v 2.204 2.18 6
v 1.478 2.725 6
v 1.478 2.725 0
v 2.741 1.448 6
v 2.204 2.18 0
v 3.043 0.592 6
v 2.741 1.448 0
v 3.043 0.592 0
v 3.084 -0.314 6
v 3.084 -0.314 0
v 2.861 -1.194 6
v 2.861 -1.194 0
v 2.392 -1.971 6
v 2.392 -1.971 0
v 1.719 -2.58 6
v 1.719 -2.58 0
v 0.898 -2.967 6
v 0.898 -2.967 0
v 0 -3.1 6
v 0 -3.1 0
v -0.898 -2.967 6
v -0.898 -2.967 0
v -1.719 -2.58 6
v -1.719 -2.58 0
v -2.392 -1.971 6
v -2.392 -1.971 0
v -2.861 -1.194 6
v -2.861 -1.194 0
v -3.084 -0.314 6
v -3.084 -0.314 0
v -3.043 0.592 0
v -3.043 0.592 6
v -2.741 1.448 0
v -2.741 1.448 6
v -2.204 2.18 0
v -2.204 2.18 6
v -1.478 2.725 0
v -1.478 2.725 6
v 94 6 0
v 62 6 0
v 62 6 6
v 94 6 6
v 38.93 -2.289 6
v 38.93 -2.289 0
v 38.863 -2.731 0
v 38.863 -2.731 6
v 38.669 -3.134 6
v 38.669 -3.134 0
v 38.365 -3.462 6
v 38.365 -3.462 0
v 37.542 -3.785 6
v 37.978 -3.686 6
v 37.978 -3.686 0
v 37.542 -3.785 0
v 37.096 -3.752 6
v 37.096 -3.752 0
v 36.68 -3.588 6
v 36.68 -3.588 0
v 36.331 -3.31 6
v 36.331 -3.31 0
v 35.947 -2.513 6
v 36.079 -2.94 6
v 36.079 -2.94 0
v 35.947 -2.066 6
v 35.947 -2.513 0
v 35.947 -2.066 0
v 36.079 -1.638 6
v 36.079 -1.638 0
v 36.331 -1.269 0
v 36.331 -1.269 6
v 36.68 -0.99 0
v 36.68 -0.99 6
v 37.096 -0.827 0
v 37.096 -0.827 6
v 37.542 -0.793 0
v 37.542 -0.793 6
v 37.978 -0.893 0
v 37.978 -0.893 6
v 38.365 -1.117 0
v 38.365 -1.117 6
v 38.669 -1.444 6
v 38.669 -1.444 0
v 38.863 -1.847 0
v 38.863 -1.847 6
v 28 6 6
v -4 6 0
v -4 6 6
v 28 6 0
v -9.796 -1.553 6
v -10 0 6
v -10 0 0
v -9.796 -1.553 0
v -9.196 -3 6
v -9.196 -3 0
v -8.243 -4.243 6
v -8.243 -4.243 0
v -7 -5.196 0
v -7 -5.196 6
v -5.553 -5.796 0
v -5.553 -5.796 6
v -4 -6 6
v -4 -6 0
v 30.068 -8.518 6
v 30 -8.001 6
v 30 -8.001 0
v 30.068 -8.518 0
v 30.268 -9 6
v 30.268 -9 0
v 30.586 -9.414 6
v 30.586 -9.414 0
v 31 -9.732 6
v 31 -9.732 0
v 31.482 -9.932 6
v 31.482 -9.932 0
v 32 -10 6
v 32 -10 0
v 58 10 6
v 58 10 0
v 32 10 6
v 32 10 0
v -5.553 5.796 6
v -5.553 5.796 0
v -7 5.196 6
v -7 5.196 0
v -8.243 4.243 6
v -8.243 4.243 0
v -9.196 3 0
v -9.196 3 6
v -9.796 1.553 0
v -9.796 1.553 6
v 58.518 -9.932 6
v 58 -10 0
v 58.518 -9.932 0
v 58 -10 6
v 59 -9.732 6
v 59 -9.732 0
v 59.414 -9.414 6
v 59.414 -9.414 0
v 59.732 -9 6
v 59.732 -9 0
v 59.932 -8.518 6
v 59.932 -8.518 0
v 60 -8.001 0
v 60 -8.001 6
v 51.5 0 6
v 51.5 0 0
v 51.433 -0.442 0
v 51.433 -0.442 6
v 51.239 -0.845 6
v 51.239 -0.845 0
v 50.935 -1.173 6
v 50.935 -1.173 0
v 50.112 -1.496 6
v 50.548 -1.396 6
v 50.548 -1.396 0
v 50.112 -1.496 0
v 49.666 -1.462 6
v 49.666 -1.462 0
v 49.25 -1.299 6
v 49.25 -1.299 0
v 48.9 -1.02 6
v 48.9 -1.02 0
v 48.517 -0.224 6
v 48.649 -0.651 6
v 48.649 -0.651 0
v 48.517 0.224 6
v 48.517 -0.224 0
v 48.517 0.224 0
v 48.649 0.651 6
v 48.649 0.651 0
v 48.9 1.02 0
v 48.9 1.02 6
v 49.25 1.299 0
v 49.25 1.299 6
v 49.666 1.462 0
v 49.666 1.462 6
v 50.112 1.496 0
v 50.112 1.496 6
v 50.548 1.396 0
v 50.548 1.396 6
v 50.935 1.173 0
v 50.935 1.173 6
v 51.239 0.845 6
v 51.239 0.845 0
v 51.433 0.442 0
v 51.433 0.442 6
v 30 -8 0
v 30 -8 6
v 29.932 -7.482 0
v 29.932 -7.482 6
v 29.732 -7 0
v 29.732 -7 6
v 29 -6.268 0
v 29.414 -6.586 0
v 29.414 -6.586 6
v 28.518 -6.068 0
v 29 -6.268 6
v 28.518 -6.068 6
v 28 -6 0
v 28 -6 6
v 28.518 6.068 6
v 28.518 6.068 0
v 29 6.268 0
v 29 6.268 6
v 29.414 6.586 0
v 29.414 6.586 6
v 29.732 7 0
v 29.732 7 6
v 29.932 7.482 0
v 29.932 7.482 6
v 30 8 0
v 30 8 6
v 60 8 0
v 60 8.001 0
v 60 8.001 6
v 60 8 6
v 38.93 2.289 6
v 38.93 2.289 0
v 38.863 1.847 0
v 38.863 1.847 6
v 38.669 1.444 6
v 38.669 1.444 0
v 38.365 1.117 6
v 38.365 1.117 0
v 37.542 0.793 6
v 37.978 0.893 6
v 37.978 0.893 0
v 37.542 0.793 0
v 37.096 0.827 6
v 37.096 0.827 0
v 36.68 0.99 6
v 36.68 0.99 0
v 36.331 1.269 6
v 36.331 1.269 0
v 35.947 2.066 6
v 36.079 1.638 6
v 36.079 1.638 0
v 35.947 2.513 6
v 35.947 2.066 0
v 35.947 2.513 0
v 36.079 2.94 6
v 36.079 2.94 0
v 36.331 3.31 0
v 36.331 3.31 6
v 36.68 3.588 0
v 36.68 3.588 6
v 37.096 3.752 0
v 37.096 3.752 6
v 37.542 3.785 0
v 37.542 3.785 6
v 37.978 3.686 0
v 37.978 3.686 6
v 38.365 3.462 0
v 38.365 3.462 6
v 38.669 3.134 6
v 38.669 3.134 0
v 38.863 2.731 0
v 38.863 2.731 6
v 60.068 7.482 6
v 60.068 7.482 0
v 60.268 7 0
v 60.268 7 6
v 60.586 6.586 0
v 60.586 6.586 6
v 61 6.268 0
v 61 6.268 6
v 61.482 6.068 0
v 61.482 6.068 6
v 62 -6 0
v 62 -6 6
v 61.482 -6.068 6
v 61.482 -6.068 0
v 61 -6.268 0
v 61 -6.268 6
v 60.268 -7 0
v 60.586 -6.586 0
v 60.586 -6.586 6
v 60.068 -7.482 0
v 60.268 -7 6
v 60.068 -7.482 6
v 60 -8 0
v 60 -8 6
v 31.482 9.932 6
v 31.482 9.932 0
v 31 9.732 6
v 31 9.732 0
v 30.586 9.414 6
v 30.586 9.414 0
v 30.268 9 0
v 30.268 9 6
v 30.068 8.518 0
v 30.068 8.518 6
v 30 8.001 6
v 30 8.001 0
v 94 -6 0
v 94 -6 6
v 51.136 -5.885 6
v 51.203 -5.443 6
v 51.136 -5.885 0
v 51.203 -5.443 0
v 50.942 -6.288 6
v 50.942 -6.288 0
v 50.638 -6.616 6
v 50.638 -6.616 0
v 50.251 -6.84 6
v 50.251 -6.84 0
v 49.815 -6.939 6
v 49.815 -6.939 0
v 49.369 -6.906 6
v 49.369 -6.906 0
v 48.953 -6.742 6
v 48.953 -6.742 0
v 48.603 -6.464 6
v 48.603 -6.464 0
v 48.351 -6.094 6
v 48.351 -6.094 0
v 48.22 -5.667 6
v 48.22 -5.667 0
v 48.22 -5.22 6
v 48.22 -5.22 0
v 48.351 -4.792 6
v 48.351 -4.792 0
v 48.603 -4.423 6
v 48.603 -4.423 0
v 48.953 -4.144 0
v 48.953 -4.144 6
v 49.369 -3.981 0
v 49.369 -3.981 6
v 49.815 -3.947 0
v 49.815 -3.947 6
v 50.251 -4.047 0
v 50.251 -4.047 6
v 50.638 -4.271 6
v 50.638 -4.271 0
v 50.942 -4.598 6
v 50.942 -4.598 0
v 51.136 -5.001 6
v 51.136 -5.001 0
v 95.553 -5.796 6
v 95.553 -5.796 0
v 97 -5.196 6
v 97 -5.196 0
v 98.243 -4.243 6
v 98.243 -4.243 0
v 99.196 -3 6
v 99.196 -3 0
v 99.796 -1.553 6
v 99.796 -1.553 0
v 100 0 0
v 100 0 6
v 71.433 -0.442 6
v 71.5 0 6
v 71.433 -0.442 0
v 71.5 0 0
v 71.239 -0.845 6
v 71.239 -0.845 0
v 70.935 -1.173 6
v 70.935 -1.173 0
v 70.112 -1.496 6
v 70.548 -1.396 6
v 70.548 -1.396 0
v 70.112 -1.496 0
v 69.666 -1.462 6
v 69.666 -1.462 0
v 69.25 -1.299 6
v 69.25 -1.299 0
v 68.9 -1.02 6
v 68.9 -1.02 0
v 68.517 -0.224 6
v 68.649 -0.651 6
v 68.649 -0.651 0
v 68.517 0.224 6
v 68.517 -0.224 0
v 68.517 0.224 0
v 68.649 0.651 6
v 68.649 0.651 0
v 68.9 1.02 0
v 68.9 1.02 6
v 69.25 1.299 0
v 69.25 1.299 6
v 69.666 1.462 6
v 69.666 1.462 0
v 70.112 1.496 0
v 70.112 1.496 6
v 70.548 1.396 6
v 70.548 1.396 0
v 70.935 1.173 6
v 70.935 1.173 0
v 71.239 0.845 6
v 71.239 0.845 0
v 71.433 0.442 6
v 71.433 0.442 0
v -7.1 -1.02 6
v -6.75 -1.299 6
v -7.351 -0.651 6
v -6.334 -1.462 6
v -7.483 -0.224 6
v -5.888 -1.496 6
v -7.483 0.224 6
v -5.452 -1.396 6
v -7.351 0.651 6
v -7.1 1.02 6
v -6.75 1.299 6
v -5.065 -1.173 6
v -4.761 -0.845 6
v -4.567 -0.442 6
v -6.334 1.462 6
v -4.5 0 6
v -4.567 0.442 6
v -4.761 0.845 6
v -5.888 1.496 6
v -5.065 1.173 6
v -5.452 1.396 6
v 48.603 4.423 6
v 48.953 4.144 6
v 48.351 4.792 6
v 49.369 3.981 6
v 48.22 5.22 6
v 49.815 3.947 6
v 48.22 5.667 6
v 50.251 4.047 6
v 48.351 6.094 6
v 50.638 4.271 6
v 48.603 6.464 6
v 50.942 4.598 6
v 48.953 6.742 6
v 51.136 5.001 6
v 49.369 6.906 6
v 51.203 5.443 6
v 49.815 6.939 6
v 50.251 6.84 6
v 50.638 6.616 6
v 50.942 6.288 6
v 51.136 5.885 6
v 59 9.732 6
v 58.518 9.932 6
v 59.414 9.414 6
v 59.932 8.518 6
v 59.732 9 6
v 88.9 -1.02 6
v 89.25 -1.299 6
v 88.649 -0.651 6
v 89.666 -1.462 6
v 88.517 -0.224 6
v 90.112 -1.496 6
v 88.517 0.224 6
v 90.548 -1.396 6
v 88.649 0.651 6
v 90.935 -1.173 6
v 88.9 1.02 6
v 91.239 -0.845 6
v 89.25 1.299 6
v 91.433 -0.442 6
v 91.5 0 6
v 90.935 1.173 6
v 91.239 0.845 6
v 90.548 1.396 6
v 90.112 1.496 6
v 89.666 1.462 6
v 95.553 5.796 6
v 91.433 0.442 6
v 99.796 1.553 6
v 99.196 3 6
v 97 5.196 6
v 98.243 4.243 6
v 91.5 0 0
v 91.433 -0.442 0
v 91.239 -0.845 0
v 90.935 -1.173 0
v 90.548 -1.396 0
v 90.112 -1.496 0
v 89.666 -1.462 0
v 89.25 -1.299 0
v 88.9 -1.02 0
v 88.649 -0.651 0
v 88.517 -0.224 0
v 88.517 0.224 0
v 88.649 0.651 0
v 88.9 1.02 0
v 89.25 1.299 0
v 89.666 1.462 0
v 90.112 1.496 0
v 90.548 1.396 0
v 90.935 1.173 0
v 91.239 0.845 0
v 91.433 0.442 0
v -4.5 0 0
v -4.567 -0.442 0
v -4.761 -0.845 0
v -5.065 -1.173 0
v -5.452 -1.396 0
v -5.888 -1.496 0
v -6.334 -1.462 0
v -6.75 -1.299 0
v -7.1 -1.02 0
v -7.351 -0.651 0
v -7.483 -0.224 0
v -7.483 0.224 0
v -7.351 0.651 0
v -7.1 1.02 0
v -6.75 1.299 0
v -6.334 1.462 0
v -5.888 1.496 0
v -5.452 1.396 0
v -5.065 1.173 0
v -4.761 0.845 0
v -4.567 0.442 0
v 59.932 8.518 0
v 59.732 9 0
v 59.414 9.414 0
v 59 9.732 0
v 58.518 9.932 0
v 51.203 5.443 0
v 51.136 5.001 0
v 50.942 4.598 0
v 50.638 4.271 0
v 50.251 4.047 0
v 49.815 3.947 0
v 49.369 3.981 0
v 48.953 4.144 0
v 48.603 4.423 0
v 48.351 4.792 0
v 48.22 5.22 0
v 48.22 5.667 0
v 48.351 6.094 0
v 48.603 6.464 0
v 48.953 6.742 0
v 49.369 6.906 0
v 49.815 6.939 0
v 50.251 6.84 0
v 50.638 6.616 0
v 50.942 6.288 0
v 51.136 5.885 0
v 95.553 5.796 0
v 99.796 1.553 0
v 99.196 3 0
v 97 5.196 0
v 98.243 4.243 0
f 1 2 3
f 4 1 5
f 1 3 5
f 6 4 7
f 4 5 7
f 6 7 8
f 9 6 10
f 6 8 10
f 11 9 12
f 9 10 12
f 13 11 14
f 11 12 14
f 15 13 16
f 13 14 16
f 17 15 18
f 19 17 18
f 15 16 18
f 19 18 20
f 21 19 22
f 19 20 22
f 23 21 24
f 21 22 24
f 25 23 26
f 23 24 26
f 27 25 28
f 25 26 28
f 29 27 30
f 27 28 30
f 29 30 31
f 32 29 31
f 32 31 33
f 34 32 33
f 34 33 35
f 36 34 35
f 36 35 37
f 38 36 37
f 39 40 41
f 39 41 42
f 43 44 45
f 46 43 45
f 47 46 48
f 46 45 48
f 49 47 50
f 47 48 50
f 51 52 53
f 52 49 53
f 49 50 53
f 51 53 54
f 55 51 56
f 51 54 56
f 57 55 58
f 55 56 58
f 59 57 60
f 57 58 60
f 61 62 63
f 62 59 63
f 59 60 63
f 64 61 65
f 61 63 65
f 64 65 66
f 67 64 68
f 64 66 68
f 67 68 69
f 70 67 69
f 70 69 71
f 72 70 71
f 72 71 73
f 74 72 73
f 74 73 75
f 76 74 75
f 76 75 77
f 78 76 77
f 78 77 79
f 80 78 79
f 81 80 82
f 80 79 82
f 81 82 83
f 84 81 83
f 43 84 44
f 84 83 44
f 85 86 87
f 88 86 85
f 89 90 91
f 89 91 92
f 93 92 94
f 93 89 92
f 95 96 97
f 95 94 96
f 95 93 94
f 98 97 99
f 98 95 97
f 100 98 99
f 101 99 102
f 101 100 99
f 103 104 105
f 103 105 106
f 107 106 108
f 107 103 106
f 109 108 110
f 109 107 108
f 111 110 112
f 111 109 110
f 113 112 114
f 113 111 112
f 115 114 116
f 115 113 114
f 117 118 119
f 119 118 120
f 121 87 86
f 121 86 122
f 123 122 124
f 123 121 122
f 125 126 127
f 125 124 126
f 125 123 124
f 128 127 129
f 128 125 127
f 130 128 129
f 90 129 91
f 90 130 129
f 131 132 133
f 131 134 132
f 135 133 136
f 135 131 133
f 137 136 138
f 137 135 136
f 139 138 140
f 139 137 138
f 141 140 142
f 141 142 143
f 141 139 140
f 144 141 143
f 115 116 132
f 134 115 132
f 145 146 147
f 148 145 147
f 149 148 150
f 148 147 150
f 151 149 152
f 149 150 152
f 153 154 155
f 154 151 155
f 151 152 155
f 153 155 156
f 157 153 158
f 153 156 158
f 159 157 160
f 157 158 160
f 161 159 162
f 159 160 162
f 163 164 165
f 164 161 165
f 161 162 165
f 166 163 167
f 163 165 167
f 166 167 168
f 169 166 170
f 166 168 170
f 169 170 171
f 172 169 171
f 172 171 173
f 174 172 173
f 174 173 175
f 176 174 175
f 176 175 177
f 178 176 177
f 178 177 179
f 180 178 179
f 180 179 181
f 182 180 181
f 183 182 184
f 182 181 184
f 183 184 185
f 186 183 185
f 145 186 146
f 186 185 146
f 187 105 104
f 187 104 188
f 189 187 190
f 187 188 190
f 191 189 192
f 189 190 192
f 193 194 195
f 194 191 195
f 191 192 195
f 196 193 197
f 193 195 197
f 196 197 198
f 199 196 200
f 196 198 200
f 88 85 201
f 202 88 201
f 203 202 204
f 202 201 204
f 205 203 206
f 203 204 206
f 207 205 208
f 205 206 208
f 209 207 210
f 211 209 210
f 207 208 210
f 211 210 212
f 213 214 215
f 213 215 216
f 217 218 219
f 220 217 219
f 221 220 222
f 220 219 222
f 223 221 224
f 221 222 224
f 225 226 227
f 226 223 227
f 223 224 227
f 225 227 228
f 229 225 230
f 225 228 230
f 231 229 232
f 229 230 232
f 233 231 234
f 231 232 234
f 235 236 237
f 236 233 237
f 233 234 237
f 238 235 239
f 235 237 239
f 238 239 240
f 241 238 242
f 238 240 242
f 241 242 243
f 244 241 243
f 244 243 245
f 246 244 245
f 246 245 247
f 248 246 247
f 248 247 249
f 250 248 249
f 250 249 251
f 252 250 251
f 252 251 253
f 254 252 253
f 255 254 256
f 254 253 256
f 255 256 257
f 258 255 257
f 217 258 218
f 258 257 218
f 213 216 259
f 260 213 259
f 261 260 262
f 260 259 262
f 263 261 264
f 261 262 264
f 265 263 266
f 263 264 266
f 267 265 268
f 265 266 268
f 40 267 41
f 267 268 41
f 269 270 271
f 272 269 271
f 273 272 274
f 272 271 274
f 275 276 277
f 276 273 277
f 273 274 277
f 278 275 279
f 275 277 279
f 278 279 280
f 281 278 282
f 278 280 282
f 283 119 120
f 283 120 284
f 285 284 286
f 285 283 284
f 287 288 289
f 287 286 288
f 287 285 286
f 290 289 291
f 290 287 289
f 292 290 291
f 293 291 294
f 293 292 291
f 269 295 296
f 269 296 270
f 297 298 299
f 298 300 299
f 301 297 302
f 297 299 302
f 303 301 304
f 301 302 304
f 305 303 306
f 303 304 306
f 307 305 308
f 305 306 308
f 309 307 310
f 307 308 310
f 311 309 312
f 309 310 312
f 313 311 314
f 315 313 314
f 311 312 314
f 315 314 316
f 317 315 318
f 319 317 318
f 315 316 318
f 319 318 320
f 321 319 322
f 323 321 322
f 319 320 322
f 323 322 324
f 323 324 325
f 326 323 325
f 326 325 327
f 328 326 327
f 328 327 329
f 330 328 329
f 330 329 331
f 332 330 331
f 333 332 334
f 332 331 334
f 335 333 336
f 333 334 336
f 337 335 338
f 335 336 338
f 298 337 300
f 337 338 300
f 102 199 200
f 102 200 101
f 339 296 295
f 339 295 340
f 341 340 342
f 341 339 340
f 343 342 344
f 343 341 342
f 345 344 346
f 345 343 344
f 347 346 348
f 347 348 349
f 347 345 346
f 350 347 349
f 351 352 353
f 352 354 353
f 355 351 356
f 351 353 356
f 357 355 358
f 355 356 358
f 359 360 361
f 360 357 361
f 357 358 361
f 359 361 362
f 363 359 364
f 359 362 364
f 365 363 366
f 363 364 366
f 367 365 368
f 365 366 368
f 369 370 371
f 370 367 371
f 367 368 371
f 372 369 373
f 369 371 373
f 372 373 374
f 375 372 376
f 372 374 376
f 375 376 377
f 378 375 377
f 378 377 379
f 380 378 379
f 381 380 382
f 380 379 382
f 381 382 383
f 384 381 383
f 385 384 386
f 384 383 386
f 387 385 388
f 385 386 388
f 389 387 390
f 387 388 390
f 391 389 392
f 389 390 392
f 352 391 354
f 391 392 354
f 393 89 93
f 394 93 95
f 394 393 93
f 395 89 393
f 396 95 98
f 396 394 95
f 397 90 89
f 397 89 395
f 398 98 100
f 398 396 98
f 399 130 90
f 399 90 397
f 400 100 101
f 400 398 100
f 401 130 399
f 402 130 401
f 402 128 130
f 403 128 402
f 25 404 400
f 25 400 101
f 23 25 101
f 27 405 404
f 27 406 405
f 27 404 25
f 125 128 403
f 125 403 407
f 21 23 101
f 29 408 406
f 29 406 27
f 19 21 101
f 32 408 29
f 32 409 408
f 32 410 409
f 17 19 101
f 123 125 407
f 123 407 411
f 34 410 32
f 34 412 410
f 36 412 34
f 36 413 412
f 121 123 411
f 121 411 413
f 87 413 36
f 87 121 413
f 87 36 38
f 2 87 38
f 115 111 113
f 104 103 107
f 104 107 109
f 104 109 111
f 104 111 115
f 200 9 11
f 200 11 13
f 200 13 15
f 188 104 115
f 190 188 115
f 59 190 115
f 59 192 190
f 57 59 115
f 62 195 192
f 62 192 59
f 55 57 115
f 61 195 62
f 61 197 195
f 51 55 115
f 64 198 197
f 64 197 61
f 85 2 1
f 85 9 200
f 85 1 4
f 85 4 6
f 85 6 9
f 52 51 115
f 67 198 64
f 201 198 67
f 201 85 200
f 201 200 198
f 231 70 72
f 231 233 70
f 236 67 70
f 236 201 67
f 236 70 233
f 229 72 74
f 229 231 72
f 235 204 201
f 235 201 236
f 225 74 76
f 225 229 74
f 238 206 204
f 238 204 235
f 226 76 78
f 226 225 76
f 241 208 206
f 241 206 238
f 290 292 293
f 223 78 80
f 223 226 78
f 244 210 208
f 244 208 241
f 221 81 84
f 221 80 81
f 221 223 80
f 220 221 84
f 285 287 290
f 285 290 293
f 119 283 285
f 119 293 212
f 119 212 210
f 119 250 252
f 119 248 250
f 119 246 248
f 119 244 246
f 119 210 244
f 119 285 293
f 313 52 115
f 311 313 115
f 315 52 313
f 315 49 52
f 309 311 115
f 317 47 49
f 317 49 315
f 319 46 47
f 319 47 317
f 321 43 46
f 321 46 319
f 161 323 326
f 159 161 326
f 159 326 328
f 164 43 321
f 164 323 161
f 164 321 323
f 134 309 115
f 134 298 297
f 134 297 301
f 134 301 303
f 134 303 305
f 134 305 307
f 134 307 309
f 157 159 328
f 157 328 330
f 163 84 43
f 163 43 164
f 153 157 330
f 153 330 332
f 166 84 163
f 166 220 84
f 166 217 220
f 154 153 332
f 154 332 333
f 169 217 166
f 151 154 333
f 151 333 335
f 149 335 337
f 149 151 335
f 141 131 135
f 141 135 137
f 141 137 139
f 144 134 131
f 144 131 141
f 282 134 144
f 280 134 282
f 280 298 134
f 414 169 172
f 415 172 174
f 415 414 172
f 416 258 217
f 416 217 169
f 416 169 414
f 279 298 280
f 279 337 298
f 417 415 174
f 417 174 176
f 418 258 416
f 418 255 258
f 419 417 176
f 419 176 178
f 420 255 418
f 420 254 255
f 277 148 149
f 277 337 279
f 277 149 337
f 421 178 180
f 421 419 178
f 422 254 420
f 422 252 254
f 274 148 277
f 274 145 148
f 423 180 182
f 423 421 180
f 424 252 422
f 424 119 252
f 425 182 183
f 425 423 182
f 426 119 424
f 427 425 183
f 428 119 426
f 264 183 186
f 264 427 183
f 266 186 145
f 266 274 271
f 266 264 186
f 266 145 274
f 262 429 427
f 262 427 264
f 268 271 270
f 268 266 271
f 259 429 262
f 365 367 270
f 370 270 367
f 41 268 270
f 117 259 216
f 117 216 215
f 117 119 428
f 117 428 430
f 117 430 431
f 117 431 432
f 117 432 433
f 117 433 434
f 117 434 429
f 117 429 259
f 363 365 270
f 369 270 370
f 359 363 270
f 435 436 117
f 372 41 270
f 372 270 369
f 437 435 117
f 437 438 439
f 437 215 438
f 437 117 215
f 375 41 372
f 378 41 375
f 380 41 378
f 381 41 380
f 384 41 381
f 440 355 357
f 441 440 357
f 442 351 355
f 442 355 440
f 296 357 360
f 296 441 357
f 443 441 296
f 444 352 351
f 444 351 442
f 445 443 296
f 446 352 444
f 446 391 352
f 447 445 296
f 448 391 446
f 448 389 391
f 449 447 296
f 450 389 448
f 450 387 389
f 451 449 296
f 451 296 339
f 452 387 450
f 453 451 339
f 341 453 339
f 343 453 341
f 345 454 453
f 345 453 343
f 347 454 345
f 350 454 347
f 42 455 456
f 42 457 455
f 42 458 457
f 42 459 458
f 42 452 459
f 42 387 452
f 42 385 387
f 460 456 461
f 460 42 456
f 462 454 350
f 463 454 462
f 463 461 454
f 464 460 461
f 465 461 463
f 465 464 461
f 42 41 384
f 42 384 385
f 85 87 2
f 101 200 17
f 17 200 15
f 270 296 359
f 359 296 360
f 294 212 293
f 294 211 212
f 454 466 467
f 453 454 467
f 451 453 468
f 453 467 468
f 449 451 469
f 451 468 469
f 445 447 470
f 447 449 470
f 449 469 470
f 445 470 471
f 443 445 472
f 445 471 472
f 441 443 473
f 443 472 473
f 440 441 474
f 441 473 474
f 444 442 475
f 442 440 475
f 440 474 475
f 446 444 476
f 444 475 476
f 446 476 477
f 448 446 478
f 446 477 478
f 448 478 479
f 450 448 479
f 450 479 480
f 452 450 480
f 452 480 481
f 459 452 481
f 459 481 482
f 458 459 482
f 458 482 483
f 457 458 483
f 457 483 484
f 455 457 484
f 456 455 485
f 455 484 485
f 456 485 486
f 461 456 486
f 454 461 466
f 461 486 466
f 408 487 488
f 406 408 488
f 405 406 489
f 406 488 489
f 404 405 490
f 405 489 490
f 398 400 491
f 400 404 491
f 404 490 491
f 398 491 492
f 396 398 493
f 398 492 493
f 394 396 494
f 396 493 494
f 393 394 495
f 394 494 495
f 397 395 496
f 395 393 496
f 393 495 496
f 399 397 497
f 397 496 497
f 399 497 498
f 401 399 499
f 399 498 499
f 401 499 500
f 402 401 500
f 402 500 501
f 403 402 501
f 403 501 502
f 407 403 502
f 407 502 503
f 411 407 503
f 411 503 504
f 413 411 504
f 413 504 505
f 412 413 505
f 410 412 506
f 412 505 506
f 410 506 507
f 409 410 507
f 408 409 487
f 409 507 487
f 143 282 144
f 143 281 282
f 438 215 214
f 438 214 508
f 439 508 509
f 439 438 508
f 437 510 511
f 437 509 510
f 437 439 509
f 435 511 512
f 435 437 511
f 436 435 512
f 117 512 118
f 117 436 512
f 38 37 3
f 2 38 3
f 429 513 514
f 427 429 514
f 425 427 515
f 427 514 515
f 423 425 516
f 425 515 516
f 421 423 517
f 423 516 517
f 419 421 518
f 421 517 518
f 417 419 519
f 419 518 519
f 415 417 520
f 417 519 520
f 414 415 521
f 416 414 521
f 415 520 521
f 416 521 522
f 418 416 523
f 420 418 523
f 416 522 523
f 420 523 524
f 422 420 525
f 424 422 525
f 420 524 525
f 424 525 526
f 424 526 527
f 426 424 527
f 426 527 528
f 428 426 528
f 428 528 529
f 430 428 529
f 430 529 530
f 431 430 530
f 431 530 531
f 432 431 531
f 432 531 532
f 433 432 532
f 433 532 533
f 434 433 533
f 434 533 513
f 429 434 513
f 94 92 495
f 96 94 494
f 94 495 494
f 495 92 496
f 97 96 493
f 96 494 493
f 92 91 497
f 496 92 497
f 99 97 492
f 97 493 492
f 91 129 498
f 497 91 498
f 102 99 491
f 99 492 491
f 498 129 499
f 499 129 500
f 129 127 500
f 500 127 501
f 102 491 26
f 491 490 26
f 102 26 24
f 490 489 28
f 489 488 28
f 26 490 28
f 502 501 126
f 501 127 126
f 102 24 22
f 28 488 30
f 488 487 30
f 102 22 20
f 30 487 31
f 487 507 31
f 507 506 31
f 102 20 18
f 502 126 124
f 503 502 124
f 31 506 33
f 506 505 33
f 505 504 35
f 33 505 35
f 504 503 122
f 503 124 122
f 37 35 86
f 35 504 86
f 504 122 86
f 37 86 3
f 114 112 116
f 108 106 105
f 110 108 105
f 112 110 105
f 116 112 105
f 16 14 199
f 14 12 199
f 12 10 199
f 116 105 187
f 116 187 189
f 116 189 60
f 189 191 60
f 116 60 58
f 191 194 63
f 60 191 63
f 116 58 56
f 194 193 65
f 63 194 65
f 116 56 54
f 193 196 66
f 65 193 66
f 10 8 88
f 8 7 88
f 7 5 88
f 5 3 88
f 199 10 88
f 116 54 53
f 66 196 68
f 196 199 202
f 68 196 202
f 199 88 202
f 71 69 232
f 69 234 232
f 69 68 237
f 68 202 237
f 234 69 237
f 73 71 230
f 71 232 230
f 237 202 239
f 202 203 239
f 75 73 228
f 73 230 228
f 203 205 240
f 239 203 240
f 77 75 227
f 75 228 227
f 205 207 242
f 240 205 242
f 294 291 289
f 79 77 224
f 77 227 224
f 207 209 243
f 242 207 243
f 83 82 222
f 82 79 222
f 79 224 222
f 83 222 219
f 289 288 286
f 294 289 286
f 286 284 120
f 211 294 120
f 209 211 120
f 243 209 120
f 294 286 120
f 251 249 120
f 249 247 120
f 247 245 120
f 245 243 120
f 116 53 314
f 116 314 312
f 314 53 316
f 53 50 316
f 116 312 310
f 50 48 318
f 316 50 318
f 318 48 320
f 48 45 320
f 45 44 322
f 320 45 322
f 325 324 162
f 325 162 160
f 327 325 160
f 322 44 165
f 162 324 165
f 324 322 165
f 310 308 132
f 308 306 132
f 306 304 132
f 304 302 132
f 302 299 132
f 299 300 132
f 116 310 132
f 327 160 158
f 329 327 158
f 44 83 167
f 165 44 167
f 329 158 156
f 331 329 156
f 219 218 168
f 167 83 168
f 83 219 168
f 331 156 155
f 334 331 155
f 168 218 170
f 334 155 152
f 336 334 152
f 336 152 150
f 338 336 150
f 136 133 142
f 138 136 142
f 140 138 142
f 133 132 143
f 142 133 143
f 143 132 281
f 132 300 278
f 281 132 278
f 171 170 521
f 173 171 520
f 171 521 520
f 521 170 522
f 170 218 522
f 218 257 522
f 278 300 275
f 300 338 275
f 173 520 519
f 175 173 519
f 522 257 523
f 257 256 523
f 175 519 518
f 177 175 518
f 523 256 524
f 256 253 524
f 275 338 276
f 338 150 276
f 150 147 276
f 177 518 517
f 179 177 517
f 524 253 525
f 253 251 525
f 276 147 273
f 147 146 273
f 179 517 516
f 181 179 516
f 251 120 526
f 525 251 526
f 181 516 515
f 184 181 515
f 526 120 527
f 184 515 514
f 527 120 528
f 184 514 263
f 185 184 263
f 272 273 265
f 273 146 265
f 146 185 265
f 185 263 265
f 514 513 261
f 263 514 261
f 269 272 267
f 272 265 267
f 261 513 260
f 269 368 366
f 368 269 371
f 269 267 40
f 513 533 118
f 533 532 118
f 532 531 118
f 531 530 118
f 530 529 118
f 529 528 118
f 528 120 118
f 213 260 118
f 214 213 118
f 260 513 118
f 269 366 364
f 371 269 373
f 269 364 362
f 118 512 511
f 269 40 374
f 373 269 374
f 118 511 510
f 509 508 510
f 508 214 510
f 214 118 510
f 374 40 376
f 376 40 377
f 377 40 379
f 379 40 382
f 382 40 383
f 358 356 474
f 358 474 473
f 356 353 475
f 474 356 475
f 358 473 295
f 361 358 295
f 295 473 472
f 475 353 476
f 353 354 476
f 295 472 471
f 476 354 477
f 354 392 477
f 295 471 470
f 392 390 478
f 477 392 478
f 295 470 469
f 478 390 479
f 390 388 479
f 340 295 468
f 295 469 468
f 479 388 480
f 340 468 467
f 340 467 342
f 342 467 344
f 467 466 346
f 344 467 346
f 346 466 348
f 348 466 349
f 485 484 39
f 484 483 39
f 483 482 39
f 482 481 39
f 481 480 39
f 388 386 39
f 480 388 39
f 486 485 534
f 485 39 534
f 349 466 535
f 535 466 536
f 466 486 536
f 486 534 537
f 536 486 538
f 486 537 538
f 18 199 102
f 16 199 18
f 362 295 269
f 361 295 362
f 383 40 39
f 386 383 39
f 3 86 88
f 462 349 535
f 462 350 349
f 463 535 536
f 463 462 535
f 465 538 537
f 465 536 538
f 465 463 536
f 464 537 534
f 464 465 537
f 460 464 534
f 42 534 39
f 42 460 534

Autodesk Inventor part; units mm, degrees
ref_plane "YZ Plane" through (0, 0, 0) normal (1, 0, 0) x (0, 1, 0)
ref_plane "XZ Plane" through (0, 0, 0) normal (0, 1, 0) x (-1, 0, 0)
ref_plane "XY Plane" through (0, 0, 0) normal (0, 0, 1) x (1, 0, 0)
sketch "Sketch1" plane through (0, 0, 0) normal (0, 0, 1) x (1, 0, 0)
  line L0 (0, 0) -> (90, 0) construction
  line L1 (0, -10) -> (90, -10)
  line L2 (90, 10) -> (0, 10)
  arc A0 (0, 10) -> (0, -10) centre (0, 0) ccw
  arc A1 (90, -10) -> (90, 10) centre (90, 0) ccw
  line L3 (0, 0) -> (90, 0) construction
  circle A2 centre (0, 0) radius 3.1
  circle A3 centre (-6, 0) radius 1.5
  circle A4 centre (0, 0) radius 37.5 construction
  circle A5 centre (0, 0) radius 50 construction
  circle A6 centre (37.4301, 2.2893) radius 1.5
  circle A7 centre (37.4301, -2.2893) radius 1.5
  circle A8 centre (50, 0) radius 1.5
  circle A9 centre (49.7028, 5.4433) radius 1.5
  circle A10 centre (49.7028, -5.4433) radius 1.5
  line L4 (37.4301, 2.2893) -> (0, 0) construction
  line L5 (0, 0) -> (49.7028, 5.4433) construction
  line L6 (37.4301, -2.2893) -> (0, 0) construction
  line L7 (49.7028, -5.4433) -> (0, 0) construction
  circle A11 centre (90, 0) radius 1.5
  line L8 (-10, 10) -> (10, 10)
  line L9 (10, 10) -> (10, -10)
  line L10 (10, -10) -> (-10, -10)
  line L11 (-10, -10) -> (-10, 10)
  line L12 (-10, 10) -> (10, -10) construction
  line L13 (10, 10) -> (-10, -10) construction
  line L14 (80, 10) -> (100, 10)
  line L15 (100, 10) -> (100, -10)
  line L16 (100, -10) -> (80, -10)
  line L17 (80, -10) -> (80, 10)
  line L18 (80, 10) -> (100, -10) construction
  line L19 (100, 10) -> (80, -10) construction
  line L20 (30, 10) -> (60, 10)
  line L21 (60, 10) -> (60, -10)
  line L22 (60, -10) -> (30, -10)
  line L23 (30, -10) -> (30, 10)
  line L24 (30, 10) -> (60, -10) construction
  line L25 (60, 10) -> (30, -10) construction
  line L26 (-10, 6) -> (100, 6)
  line L27 (100, 6) -> (100, -6)
  line L28 (100, -6) -> (-10, -6)
  line L29 (-10, -6) -> (-10, 6)
  line L30 (-10, 6) -> (100, -6) construction
  line L31 (100, 6) -> (-10, -6) construction
  line L32 (-1.478, 2.725) -> (1.478, 2.725)
  circle A12 centre (70, 0) radius 1.5
  point P0 (45, 0)
  point P1 (30, 6)
  point P2 (30, -6)
  point P3 (60, -6)
  point P4 (60, 6)
  dimension "d0" = 90
  dimension "d1" = 0
  dimension "d2" = 20
  dimension "d4" = 6.2
  dimension "d5" = 3
  dimension "d6" = 6
  dimension "d7" = 0
  dimension "d8" = 75
  dimension "d9" = 100
  dimension "d10" = 3
  dimension "d11" = 3
  dimension "d12" = 3
  dimension "d13" = 3
  dimension "d14" = 3
  dimension "d15" = 3.5
  dimension "d16" = 3.5
  dimension "d17" = 6.25
  dimension "d18" = 6.25
  dimension "d19" = 3
  dimension "d22" = 20
  dimension "d23" = 20
  dimension "d24" = 20
  dimension "d25" = 20
  dimension "d26" = 30
  dimension "d27" = 20
  dimension "d28" = 12
  dimension "d31" = 2.725
  dimension "d32" = 3
  dimension "d33" = 20
  dimension "d34" = 0
extrude "Extrusion1" add sketch "Sketch1" along normal blind 6 contours L28 L11 A0 | A0 L26 L9 L28 | L23 L28 A10 L21 L1 | L9 L26 L23 L28 | L11 L26 A0 | L23 L26 A9 L21 L28 A10 | L21 L26 L17 L28 | L23 L2 L21 L26 A9 | L17 L26 A1 L28 | A1 L15 L28 | A1 L26 L15 | L32 A2 picked at (0.2541, 2.8183)
fillet "Fillet1" radius 2 8 edges at (30, 6, 3) (30, 10, 3) (60, 10, 3) (60, 6, 3) (60, -6, 3) (60, -10, 3) (30, -10, 3) (30, -6, 3)
fillet "Fillet1" radius 6 4 edges at (-10, -6, 3) (-10, 6, 3) (100, -6, 3) (100, 6, 3)
sketch "Sketch2" plane through (0, 0, 6) normal (0, 0, 1) x (1, 0, 0)
  arc A0 (94, -6) -> (94, 6) centre (94, 0) ccw projected
  line L0 (94, 6) -> (62, 6) projected
  arc A1 (60, 8) -> (62, 6) centre (62, 8) ccw projected
  arc A2 (60, 8) -> (58, 10) centre (58, 8) ccw projected
  line L1 (58, 10) -> (32, 10) projected
  arc A3 (32, 10) -> (30, 8) centre (32, 8) ccw projected
  arc A4 (28, 6) -> (30, 8) centre (28, 8) ccw projected
  line L2 (28, 6) -> (-4, 6) projected
  arc A5 (-4, 6) -> (-4, -6) centre (-4, 0) ccw projected
  line L3 (-4, -6) -> (28, -6) projected
  arc A6 (30, -8) -> (28, -6) centre (28, -8) ccw projected
  arc A7 (30, -8) -> (32, -10) centre (32, -8) ccw projected
  line L4 (32, -10) -> (58, -10) projected
  arc A8 (58, -10) -> (60, -8) centre (58, -8) ccw projected
  arc A9 (62, -6) -> (60, -8) centre (62, -8) ccw projected
  line L5 (62, -6) -> (94, -6) projected
  circle A10 centre (90, 0) radius 1.5 projected
  circle A11 centre (70, 0) radius 1.5 projected
  circle A12 centre (49.7028, 5.4433) radius 1.5 projected
  circle A13 centre (50, 0) radius 1.5 projected
  circle A14 centre (37.4301, -2.2893) radius 1.5 projected
  circle A15 centre (37.4301, 2.2893) radius 1.5 projected
  circle A16 centre (-6, 0) radius 1.5 projected
  circle A17 centre (49.7028, -5.4433) radius 1.5 projected
  line L6 (-1.478, 2.725) -> (1.478, 2.725) projected
  arc A18 (-1.478, 2.725) -> (1.478, 2.725) centre (0, 0) ccw projected
properties part number "Arm1_3D"
